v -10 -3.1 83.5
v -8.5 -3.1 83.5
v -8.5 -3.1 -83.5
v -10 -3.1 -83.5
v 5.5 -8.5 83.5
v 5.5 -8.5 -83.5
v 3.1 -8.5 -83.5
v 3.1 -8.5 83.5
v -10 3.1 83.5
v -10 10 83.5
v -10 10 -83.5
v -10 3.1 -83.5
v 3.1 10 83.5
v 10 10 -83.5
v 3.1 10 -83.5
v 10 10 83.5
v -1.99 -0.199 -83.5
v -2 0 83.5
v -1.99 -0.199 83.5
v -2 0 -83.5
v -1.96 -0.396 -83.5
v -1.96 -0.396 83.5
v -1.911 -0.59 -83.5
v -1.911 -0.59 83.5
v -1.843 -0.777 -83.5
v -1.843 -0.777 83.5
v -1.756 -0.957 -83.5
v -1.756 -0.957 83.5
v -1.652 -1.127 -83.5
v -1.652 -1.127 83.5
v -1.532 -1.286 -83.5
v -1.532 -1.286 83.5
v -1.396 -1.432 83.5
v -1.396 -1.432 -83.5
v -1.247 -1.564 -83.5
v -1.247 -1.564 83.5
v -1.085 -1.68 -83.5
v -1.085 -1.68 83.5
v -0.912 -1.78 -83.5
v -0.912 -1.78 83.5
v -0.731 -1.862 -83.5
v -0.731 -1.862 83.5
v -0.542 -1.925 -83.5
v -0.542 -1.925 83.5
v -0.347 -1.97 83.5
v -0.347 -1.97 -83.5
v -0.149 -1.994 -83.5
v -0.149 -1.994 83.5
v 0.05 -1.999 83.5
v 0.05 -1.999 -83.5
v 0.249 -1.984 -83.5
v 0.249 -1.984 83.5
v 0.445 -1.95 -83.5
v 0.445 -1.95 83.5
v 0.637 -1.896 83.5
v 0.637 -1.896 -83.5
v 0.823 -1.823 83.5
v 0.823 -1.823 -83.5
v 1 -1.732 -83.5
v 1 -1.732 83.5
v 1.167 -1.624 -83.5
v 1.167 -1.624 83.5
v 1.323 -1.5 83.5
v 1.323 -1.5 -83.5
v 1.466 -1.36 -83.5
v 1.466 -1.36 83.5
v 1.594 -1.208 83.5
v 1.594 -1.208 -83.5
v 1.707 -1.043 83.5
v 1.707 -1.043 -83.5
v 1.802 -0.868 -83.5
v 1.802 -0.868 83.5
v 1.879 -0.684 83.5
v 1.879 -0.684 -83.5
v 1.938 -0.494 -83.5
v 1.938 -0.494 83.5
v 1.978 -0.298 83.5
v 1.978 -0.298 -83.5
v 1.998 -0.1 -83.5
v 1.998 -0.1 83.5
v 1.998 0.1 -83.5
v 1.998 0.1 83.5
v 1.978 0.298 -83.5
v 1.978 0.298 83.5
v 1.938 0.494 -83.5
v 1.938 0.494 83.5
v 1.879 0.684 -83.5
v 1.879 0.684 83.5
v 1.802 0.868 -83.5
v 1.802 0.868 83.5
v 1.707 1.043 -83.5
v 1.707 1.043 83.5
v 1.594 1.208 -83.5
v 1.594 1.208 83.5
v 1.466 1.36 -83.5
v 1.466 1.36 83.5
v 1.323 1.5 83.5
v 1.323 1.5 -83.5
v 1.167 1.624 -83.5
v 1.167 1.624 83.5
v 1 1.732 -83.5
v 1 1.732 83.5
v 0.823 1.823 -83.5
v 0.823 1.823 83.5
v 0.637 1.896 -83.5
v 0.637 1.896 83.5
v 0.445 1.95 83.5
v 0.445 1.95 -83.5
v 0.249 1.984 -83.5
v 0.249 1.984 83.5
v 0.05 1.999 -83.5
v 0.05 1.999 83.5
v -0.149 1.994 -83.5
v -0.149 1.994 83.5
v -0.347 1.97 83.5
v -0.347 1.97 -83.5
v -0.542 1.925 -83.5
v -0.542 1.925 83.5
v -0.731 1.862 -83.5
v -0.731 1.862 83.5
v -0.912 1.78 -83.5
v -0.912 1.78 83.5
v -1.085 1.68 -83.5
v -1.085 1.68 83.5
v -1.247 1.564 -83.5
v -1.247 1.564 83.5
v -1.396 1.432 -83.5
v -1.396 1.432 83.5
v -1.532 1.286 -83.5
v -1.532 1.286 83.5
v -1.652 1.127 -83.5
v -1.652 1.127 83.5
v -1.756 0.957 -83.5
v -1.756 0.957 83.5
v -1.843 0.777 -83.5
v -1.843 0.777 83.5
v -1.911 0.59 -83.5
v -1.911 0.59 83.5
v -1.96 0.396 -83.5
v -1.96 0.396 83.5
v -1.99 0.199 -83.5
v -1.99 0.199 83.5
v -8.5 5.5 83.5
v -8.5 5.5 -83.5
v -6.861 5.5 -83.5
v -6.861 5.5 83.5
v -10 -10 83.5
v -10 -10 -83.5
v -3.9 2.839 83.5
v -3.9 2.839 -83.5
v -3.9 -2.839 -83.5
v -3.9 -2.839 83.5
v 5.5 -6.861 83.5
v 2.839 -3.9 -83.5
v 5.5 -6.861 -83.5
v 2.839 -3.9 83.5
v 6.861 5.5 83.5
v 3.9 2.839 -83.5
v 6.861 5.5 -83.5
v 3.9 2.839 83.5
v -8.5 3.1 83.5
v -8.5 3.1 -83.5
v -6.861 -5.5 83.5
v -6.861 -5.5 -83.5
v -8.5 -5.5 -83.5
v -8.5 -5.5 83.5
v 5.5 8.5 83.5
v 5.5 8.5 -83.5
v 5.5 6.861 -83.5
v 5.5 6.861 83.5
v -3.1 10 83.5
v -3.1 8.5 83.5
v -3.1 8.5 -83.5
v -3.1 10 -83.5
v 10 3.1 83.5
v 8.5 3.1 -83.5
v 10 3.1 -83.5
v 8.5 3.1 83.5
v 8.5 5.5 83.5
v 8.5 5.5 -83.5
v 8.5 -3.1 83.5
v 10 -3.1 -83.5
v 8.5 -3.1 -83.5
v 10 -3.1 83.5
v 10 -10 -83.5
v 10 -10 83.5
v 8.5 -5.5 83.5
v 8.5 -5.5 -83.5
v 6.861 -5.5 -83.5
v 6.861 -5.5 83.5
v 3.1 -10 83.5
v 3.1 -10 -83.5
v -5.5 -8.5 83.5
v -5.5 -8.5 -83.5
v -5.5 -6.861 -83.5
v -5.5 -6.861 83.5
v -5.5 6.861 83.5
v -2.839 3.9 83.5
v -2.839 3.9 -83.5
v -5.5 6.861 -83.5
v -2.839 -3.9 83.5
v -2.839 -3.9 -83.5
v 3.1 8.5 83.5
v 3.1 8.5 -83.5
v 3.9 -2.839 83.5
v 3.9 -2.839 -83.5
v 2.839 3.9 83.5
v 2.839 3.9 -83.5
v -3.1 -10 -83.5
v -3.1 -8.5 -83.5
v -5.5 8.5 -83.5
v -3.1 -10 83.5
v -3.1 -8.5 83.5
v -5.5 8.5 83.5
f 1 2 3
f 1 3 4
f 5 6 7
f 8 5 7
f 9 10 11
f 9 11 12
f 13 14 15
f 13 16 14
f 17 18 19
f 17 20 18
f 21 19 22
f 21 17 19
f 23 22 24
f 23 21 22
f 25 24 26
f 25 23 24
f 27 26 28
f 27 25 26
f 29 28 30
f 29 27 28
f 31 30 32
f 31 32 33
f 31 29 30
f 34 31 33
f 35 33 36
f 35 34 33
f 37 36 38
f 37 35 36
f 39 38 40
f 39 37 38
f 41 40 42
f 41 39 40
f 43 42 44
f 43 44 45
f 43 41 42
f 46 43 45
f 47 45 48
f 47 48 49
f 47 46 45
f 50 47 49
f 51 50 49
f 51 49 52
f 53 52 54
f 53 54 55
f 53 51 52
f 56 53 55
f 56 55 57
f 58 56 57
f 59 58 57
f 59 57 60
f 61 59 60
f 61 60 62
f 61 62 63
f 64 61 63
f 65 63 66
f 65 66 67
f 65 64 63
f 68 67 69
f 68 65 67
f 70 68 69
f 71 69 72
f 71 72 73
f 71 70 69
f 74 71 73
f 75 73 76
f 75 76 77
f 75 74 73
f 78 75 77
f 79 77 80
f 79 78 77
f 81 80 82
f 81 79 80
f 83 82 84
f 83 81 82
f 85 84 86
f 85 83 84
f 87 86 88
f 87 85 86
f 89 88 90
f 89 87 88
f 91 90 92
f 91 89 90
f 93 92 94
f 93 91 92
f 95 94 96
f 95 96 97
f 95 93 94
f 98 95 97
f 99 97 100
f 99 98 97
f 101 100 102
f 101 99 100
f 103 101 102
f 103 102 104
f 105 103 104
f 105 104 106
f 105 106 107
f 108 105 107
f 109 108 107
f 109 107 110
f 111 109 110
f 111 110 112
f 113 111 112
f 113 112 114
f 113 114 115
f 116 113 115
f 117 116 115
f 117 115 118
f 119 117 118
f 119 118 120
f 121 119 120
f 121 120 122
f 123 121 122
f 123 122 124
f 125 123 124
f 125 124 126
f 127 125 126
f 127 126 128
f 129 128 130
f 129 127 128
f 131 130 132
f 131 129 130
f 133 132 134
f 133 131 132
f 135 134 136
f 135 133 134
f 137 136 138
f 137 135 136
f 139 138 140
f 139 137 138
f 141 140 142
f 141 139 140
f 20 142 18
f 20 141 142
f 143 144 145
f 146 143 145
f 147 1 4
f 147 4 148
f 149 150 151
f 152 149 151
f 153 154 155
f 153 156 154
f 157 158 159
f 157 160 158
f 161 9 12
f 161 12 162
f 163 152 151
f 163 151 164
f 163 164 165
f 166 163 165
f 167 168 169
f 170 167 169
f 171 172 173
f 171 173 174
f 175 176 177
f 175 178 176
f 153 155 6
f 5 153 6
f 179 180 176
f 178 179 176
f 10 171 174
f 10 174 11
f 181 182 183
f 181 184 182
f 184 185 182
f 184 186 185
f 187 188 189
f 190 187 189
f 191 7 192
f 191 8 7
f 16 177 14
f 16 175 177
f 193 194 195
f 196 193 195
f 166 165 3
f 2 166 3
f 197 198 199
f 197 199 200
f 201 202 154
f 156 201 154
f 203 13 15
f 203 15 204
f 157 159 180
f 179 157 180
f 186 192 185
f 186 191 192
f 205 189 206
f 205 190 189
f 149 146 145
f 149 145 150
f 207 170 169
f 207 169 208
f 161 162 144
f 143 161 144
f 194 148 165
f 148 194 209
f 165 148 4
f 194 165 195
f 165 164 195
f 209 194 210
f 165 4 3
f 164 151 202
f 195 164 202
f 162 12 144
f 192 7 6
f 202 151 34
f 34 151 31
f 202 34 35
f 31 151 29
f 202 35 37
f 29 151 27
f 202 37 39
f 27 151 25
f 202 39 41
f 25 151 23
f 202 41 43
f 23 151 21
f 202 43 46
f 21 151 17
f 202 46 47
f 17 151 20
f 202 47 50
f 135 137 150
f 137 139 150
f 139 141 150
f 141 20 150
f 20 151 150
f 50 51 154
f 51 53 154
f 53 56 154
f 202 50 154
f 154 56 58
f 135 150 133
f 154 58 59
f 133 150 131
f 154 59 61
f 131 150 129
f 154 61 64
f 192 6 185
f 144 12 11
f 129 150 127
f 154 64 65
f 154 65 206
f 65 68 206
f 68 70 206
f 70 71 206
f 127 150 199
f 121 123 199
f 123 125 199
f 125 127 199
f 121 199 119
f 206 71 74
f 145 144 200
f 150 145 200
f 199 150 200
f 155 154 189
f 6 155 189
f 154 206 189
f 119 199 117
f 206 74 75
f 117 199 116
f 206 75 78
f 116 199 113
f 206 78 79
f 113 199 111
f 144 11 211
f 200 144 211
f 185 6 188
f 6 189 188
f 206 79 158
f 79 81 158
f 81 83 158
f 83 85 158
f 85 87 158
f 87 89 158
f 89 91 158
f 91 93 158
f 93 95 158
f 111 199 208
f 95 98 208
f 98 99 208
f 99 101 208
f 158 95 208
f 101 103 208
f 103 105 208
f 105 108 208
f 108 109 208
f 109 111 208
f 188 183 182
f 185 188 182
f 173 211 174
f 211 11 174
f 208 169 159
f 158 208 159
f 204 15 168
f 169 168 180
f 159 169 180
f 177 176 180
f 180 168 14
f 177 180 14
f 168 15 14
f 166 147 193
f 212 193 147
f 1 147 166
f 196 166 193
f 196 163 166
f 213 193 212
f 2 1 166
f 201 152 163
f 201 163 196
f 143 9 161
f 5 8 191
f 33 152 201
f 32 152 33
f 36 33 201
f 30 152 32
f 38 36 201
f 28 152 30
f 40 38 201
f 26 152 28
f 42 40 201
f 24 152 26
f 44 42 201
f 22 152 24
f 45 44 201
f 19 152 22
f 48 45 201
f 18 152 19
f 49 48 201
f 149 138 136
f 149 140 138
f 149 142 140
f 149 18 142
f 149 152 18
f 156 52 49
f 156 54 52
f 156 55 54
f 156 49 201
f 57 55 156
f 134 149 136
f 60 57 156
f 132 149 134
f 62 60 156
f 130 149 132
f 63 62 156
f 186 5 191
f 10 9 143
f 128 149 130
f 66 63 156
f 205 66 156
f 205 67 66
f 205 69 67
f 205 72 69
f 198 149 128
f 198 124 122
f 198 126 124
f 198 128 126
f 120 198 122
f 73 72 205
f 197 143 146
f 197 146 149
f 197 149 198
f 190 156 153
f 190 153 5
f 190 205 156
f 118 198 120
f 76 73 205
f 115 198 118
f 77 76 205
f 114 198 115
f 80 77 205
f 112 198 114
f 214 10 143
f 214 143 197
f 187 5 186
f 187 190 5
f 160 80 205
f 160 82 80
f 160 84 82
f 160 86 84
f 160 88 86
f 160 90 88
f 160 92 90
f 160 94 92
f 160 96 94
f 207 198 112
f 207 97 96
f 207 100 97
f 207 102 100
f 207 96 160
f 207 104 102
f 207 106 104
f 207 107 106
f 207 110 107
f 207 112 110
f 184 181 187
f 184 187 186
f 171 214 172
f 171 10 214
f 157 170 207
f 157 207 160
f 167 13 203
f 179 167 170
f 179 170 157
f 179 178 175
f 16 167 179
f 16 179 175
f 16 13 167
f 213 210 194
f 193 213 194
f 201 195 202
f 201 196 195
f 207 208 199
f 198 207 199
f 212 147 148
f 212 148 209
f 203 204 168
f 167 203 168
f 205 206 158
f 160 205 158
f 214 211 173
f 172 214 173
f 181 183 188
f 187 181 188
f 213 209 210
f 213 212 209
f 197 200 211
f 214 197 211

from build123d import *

# Parameters (mm, degrees)
SKETCH1_R           = 2
BOSS_EXTRUDE1_DEPTH = 83.5


with BuildPart() as part:
    # Sketch1 → Boss-Extrude1 (new, symmetric)
    with BuildSketch(Plane.XY):
        Polygon((10, 4.610379336), (10, 10), (4.610379336, 10), (3.1, 10), (3.1, 8.5), (5.5, 8.5), (5.5, 6.860660172), (2.839339828, 3.9), (0.519615242, 3.9), (-0.519615242, 3.9), (-2.839339828, 3.9), (-5.5, 6.860660172), (-5.5, 8.5), (-3.1, 8.5), (-3.1, 10), (-4.610379336, 10), (-10, 10), (-10, 4.610379336), (-10, 3.1), (-8.5, 3.1), (-8.5, 5.5), (-6.860660172, 5.5), (-3.9, 2.839339828), (-3.9, 0.519615242), (-3.9, -0.519615242), (-3.9, -2.839339828), (-6.860660172, -5.5), (-8.5, -5.5), (-8.5, -3.1), (-10, -3.1), (-10, -4.610379336), (-10, -10), (-4.610379336, -10), (-3.1, -10), (-3.1, -8.5), (-5.5, -8.5), (-5.5, -6.860660172), (-2.839339828, -3.9), (-0.519615242, -3.9), (0.519615242, -3.9), (2.839339828, -3.9), (5.5, -6.860660172), (5.5, -8.5), (3.1, -8.5), (3.1, -10), (4.610379336, -10), (10, -10), (10, -4.610379336), (10, -3.1), (8.5, -3.1), (8.5, -5.5), (6.860660172, -5.5), (3.9, -2.839339828), (3.9, -0.519615242), (3.9, 0.519615242), (3.9, 2.839339828), (6.860660172, 5.5), (8.5, 5.5), (8.5, 3.1), (10, 3.1), align=None)
        with Locations(Location((0, 0, 0), (0, 0, 180))):
            Circle(SKETCH1_R, mode=Mode.SUBTRACT)
    extrude(amount=BOSS_EXTRUDE1_DEPTH, both=True)


solid = part.part
